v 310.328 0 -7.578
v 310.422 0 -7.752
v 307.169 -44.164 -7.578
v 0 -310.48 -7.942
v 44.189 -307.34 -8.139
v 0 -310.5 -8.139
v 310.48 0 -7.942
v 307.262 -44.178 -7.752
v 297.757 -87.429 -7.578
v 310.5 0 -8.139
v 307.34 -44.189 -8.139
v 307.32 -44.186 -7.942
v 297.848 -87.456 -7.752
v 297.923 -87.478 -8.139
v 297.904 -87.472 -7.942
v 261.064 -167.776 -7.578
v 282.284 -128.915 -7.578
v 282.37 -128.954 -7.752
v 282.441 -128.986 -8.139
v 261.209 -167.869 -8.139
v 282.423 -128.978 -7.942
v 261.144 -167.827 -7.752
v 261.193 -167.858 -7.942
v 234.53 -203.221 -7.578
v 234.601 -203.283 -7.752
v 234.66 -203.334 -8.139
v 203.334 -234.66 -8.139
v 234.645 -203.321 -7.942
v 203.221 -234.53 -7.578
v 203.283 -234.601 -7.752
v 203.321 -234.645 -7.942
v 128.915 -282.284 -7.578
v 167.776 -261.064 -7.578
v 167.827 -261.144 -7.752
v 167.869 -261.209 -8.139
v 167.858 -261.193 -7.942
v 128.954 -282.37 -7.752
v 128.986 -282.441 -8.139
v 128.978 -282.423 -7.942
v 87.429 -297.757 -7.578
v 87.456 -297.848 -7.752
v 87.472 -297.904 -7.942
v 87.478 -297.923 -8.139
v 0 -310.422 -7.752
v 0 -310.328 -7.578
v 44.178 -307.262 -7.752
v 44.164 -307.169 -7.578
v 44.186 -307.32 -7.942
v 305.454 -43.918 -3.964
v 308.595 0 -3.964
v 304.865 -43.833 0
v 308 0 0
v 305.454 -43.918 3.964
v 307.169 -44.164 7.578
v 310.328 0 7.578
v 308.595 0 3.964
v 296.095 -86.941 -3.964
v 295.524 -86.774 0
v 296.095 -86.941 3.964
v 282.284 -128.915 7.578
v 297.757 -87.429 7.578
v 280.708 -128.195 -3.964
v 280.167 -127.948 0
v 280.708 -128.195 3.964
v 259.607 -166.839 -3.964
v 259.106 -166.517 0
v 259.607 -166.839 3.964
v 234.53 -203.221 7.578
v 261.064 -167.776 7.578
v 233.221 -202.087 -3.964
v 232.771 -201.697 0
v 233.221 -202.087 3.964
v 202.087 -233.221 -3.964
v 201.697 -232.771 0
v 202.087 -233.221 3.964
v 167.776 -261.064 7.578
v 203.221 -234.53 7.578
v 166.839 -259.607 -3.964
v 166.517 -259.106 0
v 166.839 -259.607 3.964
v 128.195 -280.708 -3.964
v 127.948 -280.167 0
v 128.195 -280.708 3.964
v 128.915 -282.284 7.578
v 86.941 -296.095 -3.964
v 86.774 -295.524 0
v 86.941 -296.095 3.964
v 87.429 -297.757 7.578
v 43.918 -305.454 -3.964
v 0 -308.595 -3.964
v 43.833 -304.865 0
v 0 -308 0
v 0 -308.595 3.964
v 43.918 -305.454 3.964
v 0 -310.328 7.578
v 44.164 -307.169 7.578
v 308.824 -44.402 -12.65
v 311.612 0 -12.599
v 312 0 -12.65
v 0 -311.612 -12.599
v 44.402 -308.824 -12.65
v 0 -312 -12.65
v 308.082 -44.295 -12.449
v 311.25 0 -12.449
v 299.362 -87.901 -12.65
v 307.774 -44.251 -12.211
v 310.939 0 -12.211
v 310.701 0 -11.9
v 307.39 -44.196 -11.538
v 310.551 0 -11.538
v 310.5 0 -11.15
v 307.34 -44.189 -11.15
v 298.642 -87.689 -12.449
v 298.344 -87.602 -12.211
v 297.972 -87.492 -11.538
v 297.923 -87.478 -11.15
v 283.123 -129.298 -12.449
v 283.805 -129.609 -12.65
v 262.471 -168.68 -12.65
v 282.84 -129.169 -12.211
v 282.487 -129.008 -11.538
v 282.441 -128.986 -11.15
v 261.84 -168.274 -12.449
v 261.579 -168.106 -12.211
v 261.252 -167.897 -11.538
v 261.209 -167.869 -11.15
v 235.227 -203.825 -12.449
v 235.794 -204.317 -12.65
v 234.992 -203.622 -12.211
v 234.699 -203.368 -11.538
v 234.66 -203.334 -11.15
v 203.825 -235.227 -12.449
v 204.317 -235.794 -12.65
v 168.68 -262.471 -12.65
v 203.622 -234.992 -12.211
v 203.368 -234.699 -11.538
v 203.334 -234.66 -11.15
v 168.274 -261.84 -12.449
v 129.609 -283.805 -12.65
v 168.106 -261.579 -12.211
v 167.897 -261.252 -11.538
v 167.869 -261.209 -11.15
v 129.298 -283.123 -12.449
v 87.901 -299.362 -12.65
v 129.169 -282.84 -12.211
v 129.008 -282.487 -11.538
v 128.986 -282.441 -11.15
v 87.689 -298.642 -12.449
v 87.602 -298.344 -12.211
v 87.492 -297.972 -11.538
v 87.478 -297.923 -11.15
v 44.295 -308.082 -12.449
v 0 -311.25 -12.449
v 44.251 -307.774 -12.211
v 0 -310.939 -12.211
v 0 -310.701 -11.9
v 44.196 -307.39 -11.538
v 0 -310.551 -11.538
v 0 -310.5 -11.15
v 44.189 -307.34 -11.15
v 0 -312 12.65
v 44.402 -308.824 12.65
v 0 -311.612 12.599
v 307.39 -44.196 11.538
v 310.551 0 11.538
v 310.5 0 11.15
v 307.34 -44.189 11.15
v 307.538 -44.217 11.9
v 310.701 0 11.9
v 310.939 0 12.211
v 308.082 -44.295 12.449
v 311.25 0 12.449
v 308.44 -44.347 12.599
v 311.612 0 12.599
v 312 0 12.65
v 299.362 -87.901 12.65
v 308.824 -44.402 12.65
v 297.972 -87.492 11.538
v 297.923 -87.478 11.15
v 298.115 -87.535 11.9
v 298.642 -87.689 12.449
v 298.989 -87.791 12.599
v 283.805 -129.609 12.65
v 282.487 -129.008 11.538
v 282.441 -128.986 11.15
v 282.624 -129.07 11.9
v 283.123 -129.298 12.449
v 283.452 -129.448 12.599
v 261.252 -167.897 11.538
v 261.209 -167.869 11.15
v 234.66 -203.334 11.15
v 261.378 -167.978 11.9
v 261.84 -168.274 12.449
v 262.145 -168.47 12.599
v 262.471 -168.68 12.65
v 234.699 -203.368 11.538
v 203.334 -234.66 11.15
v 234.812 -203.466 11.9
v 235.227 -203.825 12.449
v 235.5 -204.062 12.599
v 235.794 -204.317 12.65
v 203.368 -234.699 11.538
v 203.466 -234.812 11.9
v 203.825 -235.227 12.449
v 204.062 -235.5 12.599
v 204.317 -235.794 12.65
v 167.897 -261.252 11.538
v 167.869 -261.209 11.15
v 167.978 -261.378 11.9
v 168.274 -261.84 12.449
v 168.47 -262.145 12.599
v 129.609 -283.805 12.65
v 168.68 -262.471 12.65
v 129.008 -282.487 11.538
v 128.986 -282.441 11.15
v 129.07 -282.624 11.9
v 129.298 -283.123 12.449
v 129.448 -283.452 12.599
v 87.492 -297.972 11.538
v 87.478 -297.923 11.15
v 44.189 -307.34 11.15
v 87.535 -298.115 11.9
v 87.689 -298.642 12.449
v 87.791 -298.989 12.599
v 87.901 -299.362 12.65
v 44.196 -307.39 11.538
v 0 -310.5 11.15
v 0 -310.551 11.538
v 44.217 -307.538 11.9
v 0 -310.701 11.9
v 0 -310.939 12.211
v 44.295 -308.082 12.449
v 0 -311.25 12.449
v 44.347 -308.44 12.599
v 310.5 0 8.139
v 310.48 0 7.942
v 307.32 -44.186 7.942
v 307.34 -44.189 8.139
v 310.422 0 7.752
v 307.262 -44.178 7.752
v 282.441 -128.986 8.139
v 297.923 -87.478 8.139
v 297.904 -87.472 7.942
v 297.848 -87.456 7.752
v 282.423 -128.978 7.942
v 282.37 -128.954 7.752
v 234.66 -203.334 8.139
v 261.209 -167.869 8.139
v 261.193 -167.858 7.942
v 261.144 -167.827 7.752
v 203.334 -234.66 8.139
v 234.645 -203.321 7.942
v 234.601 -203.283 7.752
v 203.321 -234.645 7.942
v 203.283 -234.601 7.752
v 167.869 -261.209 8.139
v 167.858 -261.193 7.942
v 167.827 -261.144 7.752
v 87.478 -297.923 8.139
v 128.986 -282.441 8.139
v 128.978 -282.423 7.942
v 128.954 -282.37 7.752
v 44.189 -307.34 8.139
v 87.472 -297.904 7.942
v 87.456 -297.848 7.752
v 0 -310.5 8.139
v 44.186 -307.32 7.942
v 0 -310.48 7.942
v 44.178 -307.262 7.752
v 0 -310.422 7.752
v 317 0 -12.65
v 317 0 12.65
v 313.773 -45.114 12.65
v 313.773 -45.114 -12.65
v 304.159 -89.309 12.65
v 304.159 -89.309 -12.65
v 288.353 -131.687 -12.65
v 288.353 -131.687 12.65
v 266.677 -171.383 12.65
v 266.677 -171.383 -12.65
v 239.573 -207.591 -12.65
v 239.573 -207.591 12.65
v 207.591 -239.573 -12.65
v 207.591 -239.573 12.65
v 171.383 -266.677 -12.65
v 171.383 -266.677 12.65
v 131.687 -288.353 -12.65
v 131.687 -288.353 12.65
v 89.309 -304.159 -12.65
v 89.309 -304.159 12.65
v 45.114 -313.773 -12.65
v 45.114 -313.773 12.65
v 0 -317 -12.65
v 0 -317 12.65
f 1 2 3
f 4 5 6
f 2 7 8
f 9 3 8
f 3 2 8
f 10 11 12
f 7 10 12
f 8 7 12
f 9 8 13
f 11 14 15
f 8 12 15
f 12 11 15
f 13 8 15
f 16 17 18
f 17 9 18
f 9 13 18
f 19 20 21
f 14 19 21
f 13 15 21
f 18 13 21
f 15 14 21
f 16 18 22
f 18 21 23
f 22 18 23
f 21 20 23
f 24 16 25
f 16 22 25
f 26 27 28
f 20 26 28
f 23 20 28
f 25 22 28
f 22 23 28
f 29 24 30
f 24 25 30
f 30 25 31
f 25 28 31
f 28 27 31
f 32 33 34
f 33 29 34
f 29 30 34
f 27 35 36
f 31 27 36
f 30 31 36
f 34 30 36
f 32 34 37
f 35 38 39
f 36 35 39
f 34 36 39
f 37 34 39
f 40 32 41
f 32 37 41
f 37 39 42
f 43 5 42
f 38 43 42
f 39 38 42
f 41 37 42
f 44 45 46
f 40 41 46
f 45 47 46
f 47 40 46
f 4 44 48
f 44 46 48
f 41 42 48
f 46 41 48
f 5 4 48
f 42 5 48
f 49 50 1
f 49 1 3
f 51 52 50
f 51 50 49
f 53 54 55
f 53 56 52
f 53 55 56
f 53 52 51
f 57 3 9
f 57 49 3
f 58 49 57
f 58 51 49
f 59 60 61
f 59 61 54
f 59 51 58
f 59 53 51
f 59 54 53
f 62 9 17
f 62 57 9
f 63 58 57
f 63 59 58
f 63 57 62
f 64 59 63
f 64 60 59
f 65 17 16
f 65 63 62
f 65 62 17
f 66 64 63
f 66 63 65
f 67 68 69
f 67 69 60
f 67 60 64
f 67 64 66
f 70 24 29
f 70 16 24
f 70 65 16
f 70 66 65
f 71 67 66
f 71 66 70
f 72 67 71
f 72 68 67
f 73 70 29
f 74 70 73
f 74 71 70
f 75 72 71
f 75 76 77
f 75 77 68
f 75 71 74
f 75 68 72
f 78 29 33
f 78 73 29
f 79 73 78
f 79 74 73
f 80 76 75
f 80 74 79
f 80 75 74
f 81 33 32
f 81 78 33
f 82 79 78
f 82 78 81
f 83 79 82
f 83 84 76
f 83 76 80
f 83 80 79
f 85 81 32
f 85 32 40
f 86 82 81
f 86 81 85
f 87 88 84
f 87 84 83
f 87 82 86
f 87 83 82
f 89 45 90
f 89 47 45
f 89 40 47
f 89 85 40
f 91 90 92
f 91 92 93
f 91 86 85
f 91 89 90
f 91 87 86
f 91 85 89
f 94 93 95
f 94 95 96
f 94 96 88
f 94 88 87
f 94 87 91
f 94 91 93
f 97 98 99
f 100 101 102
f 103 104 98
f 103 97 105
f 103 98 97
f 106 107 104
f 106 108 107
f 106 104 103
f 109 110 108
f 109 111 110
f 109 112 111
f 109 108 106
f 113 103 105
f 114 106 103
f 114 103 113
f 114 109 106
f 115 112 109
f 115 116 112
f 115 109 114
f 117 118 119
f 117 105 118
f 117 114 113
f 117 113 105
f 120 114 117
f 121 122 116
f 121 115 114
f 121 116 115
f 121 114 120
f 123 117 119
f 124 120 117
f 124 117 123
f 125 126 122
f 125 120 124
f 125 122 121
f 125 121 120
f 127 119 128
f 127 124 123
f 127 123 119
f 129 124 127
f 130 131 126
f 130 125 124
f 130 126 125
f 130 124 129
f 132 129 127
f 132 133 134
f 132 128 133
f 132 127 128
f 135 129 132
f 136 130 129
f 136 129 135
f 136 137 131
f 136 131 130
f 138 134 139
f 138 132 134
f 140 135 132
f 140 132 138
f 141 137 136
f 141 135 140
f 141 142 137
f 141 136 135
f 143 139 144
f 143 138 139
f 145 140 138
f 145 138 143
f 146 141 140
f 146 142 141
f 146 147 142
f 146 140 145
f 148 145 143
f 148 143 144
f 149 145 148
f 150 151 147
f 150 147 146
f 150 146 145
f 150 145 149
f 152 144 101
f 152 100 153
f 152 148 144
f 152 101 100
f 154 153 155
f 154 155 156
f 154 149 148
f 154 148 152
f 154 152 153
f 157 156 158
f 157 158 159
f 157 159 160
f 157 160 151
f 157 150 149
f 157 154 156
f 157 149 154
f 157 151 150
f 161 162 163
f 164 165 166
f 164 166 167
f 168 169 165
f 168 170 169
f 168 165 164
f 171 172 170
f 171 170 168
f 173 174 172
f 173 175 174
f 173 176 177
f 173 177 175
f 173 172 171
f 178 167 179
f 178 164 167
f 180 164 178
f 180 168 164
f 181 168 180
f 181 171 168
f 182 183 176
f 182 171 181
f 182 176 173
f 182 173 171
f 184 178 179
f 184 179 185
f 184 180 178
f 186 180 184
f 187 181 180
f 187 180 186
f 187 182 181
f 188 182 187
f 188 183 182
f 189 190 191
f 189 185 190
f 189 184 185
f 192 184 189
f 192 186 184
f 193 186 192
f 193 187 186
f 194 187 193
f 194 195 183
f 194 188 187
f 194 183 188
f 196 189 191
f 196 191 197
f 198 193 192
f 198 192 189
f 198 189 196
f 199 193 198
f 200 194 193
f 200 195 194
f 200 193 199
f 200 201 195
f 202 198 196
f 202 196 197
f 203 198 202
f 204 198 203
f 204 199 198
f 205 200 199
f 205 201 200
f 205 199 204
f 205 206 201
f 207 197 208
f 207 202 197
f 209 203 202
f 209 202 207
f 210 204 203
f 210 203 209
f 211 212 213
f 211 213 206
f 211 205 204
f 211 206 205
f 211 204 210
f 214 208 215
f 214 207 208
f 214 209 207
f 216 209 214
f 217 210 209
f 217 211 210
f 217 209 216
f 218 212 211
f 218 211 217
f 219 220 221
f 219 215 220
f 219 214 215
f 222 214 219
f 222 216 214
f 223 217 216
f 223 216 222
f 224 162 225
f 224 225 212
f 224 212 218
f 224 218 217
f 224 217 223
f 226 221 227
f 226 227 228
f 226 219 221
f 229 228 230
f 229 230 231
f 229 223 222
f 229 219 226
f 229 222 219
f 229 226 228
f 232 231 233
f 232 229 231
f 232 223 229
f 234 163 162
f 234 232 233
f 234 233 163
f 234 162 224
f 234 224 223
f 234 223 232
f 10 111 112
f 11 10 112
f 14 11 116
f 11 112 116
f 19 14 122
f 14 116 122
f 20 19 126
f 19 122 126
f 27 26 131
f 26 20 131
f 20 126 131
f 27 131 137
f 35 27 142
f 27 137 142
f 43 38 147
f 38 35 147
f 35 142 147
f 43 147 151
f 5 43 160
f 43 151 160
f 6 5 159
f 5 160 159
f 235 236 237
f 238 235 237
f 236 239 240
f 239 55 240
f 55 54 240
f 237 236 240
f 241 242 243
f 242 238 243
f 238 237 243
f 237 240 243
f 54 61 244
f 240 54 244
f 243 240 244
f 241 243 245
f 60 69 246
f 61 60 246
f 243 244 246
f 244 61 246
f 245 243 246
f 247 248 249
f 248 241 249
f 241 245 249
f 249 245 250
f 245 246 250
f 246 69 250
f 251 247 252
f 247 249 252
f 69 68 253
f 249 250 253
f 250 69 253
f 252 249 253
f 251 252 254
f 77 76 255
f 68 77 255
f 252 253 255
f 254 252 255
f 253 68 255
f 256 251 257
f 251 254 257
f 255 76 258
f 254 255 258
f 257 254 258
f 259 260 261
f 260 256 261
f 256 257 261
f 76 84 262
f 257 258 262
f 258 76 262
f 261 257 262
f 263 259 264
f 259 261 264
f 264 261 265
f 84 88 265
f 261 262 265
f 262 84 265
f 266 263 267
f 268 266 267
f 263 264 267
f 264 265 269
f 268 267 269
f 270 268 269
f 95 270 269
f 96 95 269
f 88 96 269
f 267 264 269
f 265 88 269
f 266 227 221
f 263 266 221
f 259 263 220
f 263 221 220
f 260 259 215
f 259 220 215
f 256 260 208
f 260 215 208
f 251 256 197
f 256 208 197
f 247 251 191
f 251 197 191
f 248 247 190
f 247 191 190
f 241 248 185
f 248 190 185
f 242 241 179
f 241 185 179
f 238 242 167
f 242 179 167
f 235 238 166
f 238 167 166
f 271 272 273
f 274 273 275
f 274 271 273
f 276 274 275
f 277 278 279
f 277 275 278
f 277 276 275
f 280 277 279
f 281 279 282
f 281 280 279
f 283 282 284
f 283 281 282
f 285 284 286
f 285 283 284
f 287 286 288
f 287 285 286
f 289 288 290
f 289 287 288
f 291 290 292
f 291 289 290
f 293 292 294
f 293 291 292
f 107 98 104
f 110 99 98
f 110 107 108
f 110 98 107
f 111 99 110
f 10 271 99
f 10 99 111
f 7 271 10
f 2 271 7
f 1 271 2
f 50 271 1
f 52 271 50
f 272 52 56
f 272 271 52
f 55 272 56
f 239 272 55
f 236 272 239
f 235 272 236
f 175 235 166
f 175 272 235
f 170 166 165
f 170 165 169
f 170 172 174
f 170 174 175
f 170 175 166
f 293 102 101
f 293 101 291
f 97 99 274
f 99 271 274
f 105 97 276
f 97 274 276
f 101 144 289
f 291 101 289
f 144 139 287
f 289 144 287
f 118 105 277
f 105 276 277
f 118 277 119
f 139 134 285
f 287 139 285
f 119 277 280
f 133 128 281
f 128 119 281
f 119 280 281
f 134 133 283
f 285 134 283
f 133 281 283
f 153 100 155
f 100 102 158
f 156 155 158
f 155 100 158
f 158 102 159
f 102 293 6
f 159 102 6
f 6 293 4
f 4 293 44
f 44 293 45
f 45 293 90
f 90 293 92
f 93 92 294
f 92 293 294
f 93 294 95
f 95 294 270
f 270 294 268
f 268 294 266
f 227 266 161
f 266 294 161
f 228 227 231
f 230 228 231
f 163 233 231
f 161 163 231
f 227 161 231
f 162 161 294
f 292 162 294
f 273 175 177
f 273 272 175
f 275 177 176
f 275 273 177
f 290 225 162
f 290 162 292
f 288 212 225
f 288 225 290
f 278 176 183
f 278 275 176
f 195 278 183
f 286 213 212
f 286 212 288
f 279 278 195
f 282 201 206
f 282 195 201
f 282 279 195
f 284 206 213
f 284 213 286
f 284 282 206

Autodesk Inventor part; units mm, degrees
ref_plane "YZ Plane" through (0, 0, 0) normal (1, 0, 0) x (0, 1, 0)
ref_plane "XZ Plane" through (0, 0, 0) normal (0, 1, 0) x (-1, 0, 0)
ref_plane "XY Plane" through (0, 0, 0) normal (0, 0, 1) x (1, 0, 0)
sketch "草圖1" plane through (0, 0, 0) normal (1, 0, 0) x (0, 1, 0)
  line L0 (-312, 12.65) -> (-317, 12.65)
  line L1 (-317, 12.65) -> (-317, -12.65)
  line L2 (-317, -12.65) -> (-312, -12.65)
  line L3 (-308, -12.65) -> (-308, 12.65) construction
  arc A0 (-310.3276, -7.5781) -> (-310.3276, 7.5781) centre (-321.5, 0) ccw
  line L4 (-310.5, -8.1394) -> (-310.5, -11.15)
  line L5 (-310.5, 8.1394) -> (-310.5, 11.15)
  arc A1 (-310.3276, -7.5781) -> (-310.5, -8.1394) centre (-309.5, -8.1394) ccw
  arc A2 (-310.5, 8.1394) -> (-310.3276, 7.5781) centre (-309.5, 8.1394) ccw
  arc A3 (-312, -12.65) -> (-310.5, -11.15) centre (-312, -11.15) ccw
  arc A4 (-310.5, 11.15) -> (-312, 12.65) centre (-312, 11.15) ccw
  line L6 (0, 0) -> (0, 24.9603) construction
  dimension "d0" = 317
  dimension "d1" = 9
  dimension "d2" = 12.65
  dimension "d3" = 25.3
  dimension "d4" = 27
  dimension "d5" = 0
  dimension "d6" = 2.5
  dimension "d7" = 2.5
  dimension "d8" = 2
  dimension "d9" = 2
  dimension "d10" = 3
  dimension "d11" = 3
revolve "迴轉1" add sketch "草圖1" angle 90 about axis through (0, 0, 0) along (0, 0, 1)
properties part number "異形橡膠圈-半圓"
